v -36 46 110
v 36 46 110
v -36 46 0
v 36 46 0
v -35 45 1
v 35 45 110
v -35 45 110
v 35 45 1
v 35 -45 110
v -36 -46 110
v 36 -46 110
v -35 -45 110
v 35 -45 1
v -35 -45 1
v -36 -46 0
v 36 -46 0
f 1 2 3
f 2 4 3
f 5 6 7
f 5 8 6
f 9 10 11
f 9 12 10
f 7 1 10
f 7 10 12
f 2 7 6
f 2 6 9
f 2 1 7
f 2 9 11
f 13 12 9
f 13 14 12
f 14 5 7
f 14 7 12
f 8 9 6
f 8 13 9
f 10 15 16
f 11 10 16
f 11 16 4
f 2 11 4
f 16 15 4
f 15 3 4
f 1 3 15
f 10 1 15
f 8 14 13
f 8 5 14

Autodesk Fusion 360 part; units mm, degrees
sketch "Sketch1" plane through (0, 0, 0) normal (0, 0, 1) x (1, 0, 0)
  line L0 (35, 45) -> (-35, 45)
  line L1 (-35, 45) -> (-35, -45)
  line L2 (-35, -45) -> (35, -45)
  line L3 (35, -45) -> (35, 45)
  line L4 (35, 45) -> (-35, -45) construction
  line L5 (-35, 45) -> (35, -45) construction
  line L6 (36, 46) -> (-36, 46)
  line L7 (-36, 46) -> (-36, -46)
  line L8 (-36, -46) -> (36, -46)
  line L9 (36, -46) -> (36, 46)
  line L10 (36, 46) -> (-36, -46) construction
  line L11 (-36, 46) -> (36, -46) construction
  dimension "d1" = 70
  dimension "d2" = 90
  dimension "d3" = 72
  dimension "d4" = 92
extrude "Extrude1" add sketch "Sketch1" along normal blind 1 contours L0 L1 L2 L3
extrude "Extrude2" add sketch "Sketch1" along normal blind 110
